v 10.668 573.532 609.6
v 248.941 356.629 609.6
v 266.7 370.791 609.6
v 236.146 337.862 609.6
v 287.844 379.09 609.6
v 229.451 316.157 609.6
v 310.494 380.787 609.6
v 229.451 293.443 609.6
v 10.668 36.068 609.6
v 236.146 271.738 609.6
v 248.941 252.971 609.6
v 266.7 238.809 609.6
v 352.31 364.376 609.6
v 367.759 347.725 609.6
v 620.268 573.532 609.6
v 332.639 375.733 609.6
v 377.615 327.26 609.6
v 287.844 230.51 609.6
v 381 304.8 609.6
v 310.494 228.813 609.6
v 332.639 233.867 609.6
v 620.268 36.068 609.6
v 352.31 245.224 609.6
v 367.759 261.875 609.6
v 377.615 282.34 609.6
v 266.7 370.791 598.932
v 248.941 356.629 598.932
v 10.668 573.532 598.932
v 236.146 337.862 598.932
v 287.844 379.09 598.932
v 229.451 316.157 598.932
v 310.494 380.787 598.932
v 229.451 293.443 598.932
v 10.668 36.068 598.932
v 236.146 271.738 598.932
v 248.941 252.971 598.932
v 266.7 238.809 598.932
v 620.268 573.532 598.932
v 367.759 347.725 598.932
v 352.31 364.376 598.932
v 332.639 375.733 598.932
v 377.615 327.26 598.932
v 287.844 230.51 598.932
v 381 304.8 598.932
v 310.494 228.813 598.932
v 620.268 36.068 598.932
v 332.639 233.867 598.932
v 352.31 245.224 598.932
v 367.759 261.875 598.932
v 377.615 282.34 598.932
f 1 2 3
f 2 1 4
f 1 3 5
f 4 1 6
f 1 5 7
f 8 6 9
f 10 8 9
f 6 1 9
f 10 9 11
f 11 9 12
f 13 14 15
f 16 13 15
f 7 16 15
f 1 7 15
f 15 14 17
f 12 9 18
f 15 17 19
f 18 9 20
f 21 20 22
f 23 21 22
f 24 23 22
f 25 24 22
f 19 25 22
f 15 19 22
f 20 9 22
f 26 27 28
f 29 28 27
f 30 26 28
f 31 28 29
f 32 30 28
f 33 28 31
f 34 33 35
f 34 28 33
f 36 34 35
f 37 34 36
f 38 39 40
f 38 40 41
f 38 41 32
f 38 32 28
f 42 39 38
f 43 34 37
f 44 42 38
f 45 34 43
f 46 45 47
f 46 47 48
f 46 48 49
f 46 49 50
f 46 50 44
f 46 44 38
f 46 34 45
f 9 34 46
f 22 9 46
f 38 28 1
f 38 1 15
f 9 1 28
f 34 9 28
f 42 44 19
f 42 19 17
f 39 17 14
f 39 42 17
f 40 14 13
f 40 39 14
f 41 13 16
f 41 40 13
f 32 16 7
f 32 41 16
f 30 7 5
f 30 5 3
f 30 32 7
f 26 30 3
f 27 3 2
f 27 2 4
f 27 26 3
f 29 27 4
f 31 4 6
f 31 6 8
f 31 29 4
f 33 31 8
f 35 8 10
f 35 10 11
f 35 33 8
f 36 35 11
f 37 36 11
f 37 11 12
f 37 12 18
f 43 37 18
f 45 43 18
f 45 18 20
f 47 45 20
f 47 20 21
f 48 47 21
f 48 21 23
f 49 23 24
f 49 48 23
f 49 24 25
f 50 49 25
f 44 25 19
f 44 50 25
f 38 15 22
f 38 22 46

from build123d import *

# Parameters (mm, degrees)
CYLINDER_R        = 76.2
CYLINDER_DEPTH    = 10.668
BOX010_W          = 609.6
BOX010_H          = 10.668
BOX010_DEPTH      = 537.464
BOX010_ROLL_ANGLE = -90.0000000001


with BuildPart() as cablecutout:
    # Cylinder → Cylinder (new body)
    with BuildSketch(Plane(origin=(304.8, 304.8, 598.932), x_dir=(1, 0, 0), z_dir=(0, 0, 1))):
        Circle(CYLINDER_R)
    extrude(amount=CYLINDER_DEPTH)


with BuildPart() as centersupport:
    # Box010 → Box010 (new body)
    with BuildSketch(Plane.XY):
        with Locations((304.8, 5.334)):
            Rectangle(BOX010_W, BOX010_H)
    extrude(amount=BOX010_DEPTH)


with BuildPart() as centersupport_1:
    # Box010 roll: moved
    add(centersupport.part.rotate(Axis((0, 0, 0), (1, 0, 0)), BOX010_ROLL_ANGLE))


with BuildPart() as centersupport_2:
    # Box010 placement: moved
    add(centersupport_1.part.moved(Location((10.668, 36.068, 609.6))))

    # Cut: cut CableCutout
    add(cablecutout.part, mode=Mode.SUBTRACT)


solid = centersupport_2.part
